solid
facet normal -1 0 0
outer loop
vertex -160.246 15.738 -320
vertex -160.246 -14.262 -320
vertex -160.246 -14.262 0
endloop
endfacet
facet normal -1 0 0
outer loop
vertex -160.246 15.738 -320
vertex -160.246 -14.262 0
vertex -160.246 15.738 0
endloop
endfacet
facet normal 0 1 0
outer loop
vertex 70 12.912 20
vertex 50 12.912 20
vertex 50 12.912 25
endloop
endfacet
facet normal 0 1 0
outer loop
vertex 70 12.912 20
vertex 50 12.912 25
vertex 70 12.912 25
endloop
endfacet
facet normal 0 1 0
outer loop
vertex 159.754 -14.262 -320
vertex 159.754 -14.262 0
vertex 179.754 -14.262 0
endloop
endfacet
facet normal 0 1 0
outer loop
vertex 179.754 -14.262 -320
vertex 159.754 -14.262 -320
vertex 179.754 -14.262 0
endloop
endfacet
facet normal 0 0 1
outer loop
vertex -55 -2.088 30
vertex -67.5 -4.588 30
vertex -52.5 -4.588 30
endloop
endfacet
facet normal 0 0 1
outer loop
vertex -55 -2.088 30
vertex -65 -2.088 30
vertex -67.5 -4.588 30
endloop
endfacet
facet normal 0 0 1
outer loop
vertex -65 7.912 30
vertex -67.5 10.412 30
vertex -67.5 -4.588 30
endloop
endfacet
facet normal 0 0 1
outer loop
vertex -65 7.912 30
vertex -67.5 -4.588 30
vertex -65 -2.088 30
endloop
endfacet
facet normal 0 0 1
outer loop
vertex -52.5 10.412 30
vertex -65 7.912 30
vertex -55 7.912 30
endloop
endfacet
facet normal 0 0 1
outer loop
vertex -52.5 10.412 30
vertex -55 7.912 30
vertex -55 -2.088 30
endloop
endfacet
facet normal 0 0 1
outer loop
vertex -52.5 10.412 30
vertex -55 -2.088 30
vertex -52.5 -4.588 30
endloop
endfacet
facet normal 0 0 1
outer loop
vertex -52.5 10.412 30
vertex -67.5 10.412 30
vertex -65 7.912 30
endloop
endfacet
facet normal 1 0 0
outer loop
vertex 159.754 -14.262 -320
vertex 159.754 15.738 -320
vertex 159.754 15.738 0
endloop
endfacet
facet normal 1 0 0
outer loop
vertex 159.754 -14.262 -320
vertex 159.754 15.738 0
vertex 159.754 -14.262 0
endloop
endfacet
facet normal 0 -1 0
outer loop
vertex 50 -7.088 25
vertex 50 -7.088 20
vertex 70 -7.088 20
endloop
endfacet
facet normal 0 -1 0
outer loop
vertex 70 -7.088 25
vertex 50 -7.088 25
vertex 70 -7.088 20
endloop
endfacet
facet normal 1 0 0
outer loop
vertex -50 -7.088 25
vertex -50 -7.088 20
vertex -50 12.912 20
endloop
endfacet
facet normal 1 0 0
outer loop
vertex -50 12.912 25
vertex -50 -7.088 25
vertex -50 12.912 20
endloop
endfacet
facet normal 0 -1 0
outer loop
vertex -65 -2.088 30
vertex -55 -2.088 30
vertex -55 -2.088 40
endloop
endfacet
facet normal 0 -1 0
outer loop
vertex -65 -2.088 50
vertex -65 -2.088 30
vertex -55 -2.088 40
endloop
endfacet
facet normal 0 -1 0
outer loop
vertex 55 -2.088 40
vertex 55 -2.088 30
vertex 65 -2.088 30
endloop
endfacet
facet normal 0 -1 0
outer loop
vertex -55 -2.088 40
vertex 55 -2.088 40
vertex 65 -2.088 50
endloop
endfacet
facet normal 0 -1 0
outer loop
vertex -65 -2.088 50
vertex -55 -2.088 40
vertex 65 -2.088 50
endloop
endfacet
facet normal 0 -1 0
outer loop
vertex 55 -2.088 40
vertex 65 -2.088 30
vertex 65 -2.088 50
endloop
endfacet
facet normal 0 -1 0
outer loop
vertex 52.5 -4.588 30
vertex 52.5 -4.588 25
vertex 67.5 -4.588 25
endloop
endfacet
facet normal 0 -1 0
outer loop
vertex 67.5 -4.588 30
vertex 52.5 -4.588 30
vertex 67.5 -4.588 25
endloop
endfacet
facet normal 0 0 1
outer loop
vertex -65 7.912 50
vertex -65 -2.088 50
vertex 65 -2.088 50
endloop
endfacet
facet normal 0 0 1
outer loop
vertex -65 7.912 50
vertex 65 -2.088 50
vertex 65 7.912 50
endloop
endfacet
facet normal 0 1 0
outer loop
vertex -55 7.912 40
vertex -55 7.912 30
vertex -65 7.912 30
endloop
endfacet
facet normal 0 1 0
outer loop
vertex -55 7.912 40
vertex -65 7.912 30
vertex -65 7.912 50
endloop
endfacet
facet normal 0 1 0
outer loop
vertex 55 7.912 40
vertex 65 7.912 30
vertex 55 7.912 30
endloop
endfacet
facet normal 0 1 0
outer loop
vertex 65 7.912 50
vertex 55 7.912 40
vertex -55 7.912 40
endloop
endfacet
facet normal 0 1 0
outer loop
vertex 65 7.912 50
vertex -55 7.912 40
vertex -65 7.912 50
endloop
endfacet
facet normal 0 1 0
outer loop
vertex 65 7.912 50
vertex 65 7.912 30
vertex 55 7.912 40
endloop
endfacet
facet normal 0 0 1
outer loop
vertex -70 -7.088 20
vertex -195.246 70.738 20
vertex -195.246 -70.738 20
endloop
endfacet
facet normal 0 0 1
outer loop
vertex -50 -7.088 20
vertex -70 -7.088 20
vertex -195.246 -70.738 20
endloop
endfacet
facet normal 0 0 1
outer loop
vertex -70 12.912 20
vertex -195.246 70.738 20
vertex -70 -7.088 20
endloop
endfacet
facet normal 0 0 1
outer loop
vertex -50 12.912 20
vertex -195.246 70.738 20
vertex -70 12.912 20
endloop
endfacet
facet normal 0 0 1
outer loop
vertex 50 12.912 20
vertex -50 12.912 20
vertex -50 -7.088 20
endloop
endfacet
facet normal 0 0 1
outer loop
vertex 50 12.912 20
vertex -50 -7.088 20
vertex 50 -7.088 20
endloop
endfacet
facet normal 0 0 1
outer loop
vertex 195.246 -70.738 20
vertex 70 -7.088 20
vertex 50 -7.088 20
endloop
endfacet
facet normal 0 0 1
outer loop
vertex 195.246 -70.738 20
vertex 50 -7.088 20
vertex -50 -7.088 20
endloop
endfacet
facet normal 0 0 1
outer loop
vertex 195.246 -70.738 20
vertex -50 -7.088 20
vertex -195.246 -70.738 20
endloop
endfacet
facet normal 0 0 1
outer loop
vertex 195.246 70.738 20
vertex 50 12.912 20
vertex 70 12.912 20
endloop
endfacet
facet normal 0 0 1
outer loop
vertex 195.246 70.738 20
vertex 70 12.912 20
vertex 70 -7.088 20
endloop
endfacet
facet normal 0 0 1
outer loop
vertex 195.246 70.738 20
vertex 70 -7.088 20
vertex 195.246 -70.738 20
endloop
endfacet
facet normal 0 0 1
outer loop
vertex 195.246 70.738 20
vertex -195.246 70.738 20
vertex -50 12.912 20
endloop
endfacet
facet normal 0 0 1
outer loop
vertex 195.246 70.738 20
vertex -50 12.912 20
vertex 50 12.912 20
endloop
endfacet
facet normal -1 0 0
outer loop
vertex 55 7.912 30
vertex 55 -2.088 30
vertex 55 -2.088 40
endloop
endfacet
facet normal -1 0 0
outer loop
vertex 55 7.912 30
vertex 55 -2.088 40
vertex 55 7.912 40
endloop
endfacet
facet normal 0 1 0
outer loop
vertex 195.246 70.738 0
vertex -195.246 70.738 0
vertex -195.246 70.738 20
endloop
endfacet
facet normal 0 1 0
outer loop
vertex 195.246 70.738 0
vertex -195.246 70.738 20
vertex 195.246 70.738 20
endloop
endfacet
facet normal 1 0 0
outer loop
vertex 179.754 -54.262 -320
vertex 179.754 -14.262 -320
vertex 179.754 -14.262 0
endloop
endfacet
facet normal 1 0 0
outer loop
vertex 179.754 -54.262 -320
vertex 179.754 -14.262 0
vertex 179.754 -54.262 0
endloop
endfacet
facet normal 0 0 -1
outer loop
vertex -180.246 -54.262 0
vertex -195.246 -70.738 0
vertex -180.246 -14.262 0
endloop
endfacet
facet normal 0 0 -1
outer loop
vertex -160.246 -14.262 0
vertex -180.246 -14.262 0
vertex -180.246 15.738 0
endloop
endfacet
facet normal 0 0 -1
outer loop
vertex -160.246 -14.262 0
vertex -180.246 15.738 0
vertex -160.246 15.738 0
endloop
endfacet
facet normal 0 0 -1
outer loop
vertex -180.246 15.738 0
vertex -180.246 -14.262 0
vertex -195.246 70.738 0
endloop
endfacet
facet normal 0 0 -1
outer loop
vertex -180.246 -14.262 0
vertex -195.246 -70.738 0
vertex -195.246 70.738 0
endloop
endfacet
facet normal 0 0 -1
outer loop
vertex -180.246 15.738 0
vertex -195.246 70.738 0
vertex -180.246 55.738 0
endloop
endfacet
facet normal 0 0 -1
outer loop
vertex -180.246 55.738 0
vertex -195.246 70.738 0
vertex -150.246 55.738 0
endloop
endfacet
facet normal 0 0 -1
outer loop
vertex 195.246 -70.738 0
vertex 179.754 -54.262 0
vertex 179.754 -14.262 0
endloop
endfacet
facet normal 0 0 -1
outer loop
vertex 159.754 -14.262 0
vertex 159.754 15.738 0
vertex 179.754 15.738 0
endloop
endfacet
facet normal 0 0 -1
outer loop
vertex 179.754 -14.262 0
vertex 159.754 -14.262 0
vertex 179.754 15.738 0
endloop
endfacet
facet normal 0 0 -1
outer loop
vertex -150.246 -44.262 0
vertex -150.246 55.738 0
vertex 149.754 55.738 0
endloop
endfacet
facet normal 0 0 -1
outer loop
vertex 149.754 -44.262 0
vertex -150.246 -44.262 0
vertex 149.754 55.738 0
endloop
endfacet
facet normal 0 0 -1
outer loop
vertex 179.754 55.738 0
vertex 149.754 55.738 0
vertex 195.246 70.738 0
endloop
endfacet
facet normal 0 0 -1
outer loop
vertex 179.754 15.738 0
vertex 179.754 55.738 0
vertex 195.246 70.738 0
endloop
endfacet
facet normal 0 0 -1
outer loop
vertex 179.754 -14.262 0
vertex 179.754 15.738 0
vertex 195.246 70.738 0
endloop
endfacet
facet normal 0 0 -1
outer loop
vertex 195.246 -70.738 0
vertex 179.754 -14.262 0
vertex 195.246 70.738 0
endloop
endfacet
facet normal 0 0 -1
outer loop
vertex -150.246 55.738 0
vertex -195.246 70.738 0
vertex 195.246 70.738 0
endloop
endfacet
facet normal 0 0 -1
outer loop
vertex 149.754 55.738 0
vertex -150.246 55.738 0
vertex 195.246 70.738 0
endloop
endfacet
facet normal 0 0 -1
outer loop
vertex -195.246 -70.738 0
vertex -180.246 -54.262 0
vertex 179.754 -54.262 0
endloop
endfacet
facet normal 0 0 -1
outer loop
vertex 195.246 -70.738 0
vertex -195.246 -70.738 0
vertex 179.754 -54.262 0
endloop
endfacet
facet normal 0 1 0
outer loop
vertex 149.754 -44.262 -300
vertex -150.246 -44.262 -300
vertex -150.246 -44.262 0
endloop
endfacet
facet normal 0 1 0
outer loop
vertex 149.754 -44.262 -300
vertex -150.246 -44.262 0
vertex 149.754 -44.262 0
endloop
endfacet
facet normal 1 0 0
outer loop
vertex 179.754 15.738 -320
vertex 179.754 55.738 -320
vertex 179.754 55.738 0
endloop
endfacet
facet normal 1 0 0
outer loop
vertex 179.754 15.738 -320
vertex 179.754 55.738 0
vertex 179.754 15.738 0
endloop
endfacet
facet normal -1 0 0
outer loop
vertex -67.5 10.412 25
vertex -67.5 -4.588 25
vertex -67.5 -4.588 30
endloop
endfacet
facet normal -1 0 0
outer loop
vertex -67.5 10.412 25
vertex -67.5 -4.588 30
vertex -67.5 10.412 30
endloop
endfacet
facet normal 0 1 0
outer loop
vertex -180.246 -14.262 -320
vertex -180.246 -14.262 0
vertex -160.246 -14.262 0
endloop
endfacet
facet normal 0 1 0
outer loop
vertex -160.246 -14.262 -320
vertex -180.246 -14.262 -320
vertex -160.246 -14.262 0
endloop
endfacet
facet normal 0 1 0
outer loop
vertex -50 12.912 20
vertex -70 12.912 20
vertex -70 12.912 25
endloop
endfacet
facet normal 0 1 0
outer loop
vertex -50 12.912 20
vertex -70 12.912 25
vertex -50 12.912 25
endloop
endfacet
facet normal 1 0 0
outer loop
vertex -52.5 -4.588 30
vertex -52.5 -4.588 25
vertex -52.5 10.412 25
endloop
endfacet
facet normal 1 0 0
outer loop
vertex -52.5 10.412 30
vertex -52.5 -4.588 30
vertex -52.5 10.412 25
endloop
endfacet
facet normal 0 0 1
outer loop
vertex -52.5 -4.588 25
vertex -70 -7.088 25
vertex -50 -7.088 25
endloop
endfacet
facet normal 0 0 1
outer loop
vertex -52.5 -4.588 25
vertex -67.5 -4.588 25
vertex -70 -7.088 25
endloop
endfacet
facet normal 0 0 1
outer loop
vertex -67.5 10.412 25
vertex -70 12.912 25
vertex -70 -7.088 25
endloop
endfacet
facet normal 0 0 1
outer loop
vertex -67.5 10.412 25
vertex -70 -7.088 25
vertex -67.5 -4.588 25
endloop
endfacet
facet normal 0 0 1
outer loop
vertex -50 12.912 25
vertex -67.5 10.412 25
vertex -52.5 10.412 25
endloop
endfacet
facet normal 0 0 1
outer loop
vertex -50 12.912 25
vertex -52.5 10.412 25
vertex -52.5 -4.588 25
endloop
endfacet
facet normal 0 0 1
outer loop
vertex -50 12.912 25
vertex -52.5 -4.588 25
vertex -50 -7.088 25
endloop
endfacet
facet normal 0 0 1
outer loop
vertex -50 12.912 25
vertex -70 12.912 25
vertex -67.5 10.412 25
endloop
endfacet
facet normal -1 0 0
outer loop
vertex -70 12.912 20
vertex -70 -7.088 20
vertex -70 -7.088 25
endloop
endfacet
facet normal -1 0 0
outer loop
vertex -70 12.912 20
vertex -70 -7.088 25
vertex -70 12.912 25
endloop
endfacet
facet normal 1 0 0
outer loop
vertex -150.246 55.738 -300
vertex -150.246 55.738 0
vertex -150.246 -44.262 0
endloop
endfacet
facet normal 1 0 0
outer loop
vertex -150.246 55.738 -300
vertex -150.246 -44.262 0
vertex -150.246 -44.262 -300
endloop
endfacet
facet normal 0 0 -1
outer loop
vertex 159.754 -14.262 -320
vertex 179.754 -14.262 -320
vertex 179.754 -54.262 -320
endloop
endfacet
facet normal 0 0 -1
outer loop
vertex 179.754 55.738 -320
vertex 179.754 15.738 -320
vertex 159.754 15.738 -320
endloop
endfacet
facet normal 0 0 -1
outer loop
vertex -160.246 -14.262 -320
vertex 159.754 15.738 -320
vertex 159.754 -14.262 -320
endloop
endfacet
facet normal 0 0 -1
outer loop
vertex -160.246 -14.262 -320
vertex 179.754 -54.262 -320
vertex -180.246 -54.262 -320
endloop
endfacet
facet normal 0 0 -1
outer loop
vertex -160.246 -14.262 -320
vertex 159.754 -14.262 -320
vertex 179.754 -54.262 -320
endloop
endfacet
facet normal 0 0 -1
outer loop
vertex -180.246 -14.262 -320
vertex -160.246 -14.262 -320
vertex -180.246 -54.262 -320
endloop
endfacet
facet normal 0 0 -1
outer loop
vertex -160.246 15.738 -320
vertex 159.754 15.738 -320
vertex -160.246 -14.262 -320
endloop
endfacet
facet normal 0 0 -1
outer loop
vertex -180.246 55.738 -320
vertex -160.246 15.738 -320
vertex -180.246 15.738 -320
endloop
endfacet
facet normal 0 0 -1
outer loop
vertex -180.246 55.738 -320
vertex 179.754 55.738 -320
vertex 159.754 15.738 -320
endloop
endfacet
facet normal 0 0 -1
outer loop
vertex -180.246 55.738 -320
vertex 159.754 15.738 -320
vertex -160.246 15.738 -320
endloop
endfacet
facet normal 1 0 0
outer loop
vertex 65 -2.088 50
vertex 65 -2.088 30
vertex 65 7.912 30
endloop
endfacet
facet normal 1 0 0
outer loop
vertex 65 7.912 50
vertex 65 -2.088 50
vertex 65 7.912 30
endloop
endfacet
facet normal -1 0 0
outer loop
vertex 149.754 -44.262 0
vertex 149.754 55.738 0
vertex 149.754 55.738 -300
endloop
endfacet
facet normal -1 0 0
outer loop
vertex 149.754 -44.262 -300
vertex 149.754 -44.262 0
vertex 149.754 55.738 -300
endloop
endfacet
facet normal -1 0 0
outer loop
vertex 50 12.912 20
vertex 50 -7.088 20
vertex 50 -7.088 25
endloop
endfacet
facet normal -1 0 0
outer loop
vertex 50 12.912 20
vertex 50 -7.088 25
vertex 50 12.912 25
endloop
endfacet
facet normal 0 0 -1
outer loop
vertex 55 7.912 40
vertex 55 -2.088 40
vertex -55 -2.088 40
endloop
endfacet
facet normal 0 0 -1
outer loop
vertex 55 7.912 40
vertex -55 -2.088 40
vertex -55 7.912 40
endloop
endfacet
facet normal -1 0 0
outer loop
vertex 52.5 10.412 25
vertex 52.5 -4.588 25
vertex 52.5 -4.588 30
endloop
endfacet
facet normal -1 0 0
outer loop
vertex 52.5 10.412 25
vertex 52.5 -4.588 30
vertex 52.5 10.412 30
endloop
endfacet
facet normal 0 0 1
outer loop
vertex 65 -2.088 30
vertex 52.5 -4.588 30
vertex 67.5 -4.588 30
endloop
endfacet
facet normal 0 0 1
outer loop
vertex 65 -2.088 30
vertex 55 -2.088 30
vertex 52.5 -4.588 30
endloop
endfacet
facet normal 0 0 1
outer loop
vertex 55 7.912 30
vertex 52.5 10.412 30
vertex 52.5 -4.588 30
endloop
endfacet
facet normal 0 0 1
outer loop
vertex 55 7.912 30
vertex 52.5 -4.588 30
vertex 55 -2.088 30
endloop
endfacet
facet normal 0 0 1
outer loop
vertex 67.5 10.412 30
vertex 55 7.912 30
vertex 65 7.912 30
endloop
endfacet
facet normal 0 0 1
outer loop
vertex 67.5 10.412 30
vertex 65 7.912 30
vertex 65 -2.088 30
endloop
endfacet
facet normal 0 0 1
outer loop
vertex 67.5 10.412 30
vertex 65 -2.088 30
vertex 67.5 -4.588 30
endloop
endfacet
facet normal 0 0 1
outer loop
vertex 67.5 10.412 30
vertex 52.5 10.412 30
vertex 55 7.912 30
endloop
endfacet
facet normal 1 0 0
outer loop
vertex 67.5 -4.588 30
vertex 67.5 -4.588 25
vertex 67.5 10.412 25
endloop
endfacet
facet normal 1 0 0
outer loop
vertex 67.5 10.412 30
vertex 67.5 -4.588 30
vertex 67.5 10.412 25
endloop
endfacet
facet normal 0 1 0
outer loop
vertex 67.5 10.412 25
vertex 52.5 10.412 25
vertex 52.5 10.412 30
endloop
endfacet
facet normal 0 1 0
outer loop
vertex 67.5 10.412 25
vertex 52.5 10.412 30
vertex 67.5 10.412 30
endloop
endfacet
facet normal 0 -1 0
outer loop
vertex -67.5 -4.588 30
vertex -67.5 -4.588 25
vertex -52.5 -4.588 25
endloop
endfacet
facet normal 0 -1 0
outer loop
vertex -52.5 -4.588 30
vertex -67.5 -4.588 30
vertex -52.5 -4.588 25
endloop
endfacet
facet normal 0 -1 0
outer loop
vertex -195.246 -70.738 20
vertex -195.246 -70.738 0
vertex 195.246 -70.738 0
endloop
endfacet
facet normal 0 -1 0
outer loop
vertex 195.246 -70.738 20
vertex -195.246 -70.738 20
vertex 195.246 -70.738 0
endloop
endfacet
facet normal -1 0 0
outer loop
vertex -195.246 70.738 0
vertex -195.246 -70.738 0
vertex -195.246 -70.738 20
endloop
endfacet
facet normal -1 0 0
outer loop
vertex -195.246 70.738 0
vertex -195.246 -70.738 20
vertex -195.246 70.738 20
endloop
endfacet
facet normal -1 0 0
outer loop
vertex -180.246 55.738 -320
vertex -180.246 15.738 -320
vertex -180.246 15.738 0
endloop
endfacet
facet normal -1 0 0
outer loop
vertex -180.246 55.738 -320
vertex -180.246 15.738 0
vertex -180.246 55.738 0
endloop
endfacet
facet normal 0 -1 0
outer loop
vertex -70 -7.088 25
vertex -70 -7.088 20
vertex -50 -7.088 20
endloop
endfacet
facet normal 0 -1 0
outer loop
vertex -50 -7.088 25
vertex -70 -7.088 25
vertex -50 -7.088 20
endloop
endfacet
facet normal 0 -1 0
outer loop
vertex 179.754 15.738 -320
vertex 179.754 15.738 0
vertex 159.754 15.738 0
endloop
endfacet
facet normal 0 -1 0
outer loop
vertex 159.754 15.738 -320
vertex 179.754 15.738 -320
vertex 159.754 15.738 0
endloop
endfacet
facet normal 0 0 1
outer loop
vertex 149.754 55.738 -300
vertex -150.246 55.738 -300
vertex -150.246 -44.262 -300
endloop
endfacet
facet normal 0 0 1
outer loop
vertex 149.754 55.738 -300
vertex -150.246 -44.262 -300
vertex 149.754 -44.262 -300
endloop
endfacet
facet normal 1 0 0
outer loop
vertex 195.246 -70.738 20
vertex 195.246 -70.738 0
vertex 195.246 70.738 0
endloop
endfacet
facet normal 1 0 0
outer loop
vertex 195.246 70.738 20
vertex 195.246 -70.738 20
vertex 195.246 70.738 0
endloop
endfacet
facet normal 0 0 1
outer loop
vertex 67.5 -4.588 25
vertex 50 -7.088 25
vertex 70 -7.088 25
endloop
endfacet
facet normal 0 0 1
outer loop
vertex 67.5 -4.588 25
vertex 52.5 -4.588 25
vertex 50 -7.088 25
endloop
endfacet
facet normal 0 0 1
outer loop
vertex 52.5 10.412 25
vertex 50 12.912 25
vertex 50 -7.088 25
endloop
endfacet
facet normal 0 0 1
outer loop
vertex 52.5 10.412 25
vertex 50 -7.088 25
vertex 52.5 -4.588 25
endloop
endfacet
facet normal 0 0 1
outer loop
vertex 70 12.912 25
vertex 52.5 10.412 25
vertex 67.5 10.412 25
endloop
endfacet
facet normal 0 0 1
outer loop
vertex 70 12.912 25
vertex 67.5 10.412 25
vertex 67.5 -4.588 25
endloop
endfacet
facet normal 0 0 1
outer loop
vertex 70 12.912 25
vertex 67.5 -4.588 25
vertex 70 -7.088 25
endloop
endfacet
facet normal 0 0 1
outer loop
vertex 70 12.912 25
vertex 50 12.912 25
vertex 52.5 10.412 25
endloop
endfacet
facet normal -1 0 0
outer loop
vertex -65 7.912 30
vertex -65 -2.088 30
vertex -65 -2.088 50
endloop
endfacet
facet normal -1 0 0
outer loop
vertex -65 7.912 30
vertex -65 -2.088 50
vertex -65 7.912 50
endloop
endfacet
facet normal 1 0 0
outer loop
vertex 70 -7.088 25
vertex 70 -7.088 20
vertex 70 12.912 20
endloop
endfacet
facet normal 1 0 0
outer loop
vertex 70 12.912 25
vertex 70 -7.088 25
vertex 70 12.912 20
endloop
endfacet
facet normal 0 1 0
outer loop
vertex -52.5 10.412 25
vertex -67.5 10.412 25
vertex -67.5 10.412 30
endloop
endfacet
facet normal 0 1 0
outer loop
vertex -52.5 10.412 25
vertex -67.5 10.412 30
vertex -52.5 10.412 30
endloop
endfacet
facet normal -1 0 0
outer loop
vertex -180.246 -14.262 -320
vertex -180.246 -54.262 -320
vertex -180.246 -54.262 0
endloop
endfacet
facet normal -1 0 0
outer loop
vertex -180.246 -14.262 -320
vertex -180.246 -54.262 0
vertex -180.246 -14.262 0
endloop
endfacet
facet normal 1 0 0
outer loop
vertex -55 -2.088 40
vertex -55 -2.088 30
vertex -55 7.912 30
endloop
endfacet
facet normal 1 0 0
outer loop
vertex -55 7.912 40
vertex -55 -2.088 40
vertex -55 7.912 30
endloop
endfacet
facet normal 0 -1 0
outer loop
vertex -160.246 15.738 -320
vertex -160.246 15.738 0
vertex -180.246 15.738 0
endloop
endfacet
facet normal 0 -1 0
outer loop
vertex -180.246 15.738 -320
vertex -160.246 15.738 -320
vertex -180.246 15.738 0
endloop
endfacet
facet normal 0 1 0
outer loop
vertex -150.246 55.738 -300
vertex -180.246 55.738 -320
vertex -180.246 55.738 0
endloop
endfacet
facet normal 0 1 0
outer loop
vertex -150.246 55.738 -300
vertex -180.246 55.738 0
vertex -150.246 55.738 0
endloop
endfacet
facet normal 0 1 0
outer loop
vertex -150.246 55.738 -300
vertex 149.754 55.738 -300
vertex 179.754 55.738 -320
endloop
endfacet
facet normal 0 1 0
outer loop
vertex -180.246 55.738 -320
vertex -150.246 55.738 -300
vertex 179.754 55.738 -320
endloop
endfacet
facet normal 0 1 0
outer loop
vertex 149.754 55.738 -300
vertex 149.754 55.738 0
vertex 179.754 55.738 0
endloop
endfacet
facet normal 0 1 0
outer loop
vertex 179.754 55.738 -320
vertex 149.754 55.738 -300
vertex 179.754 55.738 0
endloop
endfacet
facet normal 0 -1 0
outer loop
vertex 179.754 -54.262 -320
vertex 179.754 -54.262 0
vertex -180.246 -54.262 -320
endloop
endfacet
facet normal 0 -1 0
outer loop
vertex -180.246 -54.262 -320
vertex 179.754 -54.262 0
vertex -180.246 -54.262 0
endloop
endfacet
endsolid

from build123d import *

# Parameters (mm, degrees)
BOSS_EXTRUDE1_DEPTH = 320
SKETCH2_W           = 390.491901408
SKETCH2_H           = 141.475704226
BOSS_EXTRUDE2_DEPTH = 20
SKETCH4_W           = 300
SKETCH4_H           = 300
CUT_EXTRUDE1_DEPTH  = 100
SKETCH5_W           = 20
SKETCH5_H           = 20
BOSS_EXTRUDE3_DEPTH = 5
SKETCH6_W           = 15
SKETCH6_H           = 15
BOSS_EXTRUDE4_DEPTH = 5
SKETCH7_W           = 10
SKETCH7_H           = 10
BOSS_EXTRUDE6_DEPTH = 20
BOSS_EXTRUDE7_REACH = 252.246
SKETCH8_W           = 10
SKETCH8_H           = 10


with BuildPart() as part:
    # Sketch1 → Boss-Extrude1 (new body)
    with BuildSketch(Plane.XY):
        Polygon((-180.245950704, 55.737852113), (179.754049296, 55.737852113), (179.754049296, 15.737852113), (159.754049296, 15.737852113), (159.754049296, -14.262147887), (179.754049296, -14.262147887), (179.754049296, -54.262147887), (-180.245950704, -54.262147887), (-180.245950704, -14.262147887), (-160.245950704, -14.262147887), (-160.245950704, 15.737852113), (-180.245950704, 15.737852113), align=None)
    extrude(amount=-BOSS_EXTRUDE1_DEPTH)

    # Sketch2 → Boss-Extrude2 (add)
    with BuildSketch(Plane.XY):
        Rectangle(SKETCH2_W, SKETCH2_H)
    extrude(amount=BOSS_EXTRUDE2_DEPTH)

    # Sketch4 → Cut-Extrude1 (cut)
    with BuildSketch(Plane(origin=(0, 55.737852113, 0), x_dir=(1, 0, 0), z_dir=(0, 1, 0))):
        with Locations((-0.245950704, 150)):
            Rectangle(SKETCH4_W, SKETCH4_H)
    extrude(amount=-CUT_EXTRUDE1_DEPTH, mode=Mode.SUBTRACT)

    # Sketch5 → Boss-Extrude3 (add)
    with BuildSketch(Plane.XY.offset(20)):
        with Locations((-60, 2.912454094)):
            Rectangle(SKETCH5_W, SKETCH5_H)
        with Locations((60, 2.912454094)):
            Rectangle(SKETCH5_W, SKETCH5_H)
    extrude(amount=BOSS_EXTRUDE3_DEPTH)

    # Sketch6 → Boss-Extrude4 (add)
    with BuildSketch(Plane.XY.offset(25)):
        with Locations((-60, 2.912454094)):
            Rectangle(SKETCH6_W, SKETCH6_H)
        with Locations((60, 2.912454094)):
            Rectangle(SKETCH6_W, SKETCH6_H)
    extrude(amount=BOSS_EXTRUDE4_DEPTH)

    # Sketch7 → Boss-Extrude6 (add)
    with BuildSketch(Plane.XY.offset(30)):
        with Locations((-60, 2.912454094)):
            Rectangle(SKETCH7_W, SKETCH7_H)
        with Locations((60, 2.912454094)):
            Rectangle(SKETCH7_W, SKETCH7_H)
    extrude(amount=BOSS_EXTRUDE6_DEPTH)

    # Sketch8 → Boss-Extrude7 (add, up to next)
    with BuildSketch(Plane.ZY.offset(-55), mode=Mode.PRIVATE) as boss_extrude7_sk1:
        with Locations((45, 2.912454094)):
            Rectangle(SKETCH8_W, SKETCH8_H)
    boss_extrude7_tool1 = extrude(boss_extrude7_sk1.sketch, amount=BOSS_EXTRUDE7_REACH, mode=Mode.PRIVATE) - part.part
    add(boss_extrude7_tool1.solids().sort_by_distance((55, 2.912454, 45))[0])


solid = part.part
